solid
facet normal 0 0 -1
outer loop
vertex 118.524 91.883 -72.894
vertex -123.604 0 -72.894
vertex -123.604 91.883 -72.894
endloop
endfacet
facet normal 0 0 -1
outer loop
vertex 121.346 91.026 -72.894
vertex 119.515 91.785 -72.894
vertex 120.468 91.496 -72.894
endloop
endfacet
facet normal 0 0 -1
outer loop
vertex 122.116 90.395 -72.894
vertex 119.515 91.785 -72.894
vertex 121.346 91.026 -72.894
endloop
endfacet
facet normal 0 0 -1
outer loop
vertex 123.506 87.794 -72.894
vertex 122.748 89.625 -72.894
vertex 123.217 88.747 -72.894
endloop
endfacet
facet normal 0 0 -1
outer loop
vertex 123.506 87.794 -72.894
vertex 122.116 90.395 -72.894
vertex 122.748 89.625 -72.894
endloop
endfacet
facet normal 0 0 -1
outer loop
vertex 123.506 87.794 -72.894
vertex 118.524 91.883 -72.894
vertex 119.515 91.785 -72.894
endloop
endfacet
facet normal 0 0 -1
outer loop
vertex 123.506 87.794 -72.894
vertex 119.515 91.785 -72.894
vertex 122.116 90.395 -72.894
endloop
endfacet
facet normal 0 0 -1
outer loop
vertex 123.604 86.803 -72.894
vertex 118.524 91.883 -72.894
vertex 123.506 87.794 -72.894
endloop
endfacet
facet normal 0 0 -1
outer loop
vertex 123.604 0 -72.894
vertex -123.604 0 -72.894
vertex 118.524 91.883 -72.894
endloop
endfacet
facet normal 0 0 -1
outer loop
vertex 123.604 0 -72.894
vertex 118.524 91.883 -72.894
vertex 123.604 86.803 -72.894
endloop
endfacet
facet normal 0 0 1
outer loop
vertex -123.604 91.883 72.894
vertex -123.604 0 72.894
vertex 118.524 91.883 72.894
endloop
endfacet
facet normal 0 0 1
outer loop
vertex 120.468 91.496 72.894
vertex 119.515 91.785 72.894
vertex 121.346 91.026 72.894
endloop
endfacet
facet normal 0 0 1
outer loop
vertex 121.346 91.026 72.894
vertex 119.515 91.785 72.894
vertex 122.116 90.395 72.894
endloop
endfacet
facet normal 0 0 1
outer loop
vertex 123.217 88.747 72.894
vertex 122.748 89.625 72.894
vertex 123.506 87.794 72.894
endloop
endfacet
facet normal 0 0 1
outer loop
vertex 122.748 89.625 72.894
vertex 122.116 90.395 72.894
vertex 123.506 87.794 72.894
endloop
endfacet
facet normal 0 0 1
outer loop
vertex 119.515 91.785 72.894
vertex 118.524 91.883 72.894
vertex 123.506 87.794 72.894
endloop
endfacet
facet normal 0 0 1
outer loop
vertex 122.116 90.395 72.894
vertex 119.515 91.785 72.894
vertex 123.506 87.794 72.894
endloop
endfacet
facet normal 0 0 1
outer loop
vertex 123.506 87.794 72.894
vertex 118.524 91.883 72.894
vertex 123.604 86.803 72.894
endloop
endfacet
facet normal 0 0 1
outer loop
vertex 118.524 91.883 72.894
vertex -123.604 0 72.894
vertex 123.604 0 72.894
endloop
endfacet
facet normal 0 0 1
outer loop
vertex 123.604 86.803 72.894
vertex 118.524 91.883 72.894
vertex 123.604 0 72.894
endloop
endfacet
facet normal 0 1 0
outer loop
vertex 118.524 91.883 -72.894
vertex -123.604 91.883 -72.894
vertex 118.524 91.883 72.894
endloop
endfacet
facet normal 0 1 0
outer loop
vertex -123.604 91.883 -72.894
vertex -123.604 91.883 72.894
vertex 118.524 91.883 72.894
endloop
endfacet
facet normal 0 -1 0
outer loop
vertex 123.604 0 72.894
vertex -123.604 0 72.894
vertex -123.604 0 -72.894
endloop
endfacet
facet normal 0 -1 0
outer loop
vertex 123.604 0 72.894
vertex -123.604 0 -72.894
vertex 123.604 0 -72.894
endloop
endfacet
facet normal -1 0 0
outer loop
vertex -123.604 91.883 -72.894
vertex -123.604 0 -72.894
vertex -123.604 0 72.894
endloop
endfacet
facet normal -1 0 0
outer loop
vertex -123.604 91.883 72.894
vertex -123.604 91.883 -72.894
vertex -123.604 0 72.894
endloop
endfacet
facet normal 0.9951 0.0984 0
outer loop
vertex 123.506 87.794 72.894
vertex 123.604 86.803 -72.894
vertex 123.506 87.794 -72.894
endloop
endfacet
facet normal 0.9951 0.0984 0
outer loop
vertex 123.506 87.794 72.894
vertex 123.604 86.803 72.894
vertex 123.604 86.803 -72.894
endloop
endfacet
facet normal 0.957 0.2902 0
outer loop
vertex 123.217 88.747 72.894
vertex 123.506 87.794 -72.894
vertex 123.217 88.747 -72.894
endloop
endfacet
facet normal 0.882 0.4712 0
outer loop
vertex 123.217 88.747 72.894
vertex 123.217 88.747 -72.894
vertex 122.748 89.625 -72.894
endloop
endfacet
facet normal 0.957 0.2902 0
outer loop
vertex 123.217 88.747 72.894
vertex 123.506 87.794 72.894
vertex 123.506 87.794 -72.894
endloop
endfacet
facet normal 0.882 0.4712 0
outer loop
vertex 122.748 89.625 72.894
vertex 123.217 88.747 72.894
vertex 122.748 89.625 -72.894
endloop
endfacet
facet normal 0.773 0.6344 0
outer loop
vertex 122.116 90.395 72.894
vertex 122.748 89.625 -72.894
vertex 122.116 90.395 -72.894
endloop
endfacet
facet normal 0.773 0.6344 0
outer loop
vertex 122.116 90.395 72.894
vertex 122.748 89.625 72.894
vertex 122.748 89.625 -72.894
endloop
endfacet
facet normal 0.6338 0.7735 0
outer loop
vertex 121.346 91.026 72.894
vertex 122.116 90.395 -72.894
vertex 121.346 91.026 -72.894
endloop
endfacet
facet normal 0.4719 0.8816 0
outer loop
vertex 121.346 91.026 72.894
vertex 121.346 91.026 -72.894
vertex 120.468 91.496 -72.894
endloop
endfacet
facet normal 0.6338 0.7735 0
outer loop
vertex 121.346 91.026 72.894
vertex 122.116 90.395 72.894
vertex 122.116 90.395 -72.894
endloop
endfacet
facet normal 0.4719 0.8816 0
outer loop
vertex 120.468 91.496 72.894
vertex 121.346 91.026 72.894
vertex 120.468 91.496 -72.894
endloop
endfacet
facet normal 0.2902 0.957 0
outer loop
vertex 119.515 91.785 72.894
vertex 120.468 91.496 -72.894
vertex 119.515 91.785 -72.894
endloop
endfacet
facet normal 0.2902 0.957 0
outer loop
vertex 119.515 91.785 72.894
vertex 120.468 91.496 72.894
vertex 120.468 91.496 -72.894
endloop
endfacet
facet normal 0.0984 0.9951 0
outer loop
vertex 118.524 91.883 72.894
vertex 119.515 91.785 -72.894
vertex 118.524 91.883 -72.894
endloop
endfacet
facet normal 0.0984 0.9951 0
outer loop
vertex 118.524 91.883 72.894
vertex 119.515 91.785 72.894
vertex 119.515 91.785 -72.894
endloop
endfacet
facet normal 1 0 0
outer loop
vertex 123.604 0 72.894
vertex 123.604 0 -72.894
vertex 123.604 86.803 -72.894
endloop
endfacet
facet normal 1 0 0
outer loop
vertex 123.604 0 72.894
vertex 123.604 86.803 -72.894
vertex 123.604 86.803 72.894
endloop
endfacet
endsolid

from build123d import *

# Parameters (mm, degrees)
F0_W     = 247.208178
F0_H     = 145.787596
F1_DEPTH = 91.88254
F2_R     = 5.08


with BuildPart() as f1:
    # F0 (on Front) → F1 (new body)
    with BuildSketch(Plane.XZ):
        Rectangle(F0_W, F0_H)
    extrude(amount=-F1_DEPTH)

    # F2
    f2_edges = [f1.edges().sort_by_distance(p)[0] for p in [
        (123.604089, 91.88254, 0),
    ]]
    fillet(f2_edges, radius=F2_R)


solid = f1.part
